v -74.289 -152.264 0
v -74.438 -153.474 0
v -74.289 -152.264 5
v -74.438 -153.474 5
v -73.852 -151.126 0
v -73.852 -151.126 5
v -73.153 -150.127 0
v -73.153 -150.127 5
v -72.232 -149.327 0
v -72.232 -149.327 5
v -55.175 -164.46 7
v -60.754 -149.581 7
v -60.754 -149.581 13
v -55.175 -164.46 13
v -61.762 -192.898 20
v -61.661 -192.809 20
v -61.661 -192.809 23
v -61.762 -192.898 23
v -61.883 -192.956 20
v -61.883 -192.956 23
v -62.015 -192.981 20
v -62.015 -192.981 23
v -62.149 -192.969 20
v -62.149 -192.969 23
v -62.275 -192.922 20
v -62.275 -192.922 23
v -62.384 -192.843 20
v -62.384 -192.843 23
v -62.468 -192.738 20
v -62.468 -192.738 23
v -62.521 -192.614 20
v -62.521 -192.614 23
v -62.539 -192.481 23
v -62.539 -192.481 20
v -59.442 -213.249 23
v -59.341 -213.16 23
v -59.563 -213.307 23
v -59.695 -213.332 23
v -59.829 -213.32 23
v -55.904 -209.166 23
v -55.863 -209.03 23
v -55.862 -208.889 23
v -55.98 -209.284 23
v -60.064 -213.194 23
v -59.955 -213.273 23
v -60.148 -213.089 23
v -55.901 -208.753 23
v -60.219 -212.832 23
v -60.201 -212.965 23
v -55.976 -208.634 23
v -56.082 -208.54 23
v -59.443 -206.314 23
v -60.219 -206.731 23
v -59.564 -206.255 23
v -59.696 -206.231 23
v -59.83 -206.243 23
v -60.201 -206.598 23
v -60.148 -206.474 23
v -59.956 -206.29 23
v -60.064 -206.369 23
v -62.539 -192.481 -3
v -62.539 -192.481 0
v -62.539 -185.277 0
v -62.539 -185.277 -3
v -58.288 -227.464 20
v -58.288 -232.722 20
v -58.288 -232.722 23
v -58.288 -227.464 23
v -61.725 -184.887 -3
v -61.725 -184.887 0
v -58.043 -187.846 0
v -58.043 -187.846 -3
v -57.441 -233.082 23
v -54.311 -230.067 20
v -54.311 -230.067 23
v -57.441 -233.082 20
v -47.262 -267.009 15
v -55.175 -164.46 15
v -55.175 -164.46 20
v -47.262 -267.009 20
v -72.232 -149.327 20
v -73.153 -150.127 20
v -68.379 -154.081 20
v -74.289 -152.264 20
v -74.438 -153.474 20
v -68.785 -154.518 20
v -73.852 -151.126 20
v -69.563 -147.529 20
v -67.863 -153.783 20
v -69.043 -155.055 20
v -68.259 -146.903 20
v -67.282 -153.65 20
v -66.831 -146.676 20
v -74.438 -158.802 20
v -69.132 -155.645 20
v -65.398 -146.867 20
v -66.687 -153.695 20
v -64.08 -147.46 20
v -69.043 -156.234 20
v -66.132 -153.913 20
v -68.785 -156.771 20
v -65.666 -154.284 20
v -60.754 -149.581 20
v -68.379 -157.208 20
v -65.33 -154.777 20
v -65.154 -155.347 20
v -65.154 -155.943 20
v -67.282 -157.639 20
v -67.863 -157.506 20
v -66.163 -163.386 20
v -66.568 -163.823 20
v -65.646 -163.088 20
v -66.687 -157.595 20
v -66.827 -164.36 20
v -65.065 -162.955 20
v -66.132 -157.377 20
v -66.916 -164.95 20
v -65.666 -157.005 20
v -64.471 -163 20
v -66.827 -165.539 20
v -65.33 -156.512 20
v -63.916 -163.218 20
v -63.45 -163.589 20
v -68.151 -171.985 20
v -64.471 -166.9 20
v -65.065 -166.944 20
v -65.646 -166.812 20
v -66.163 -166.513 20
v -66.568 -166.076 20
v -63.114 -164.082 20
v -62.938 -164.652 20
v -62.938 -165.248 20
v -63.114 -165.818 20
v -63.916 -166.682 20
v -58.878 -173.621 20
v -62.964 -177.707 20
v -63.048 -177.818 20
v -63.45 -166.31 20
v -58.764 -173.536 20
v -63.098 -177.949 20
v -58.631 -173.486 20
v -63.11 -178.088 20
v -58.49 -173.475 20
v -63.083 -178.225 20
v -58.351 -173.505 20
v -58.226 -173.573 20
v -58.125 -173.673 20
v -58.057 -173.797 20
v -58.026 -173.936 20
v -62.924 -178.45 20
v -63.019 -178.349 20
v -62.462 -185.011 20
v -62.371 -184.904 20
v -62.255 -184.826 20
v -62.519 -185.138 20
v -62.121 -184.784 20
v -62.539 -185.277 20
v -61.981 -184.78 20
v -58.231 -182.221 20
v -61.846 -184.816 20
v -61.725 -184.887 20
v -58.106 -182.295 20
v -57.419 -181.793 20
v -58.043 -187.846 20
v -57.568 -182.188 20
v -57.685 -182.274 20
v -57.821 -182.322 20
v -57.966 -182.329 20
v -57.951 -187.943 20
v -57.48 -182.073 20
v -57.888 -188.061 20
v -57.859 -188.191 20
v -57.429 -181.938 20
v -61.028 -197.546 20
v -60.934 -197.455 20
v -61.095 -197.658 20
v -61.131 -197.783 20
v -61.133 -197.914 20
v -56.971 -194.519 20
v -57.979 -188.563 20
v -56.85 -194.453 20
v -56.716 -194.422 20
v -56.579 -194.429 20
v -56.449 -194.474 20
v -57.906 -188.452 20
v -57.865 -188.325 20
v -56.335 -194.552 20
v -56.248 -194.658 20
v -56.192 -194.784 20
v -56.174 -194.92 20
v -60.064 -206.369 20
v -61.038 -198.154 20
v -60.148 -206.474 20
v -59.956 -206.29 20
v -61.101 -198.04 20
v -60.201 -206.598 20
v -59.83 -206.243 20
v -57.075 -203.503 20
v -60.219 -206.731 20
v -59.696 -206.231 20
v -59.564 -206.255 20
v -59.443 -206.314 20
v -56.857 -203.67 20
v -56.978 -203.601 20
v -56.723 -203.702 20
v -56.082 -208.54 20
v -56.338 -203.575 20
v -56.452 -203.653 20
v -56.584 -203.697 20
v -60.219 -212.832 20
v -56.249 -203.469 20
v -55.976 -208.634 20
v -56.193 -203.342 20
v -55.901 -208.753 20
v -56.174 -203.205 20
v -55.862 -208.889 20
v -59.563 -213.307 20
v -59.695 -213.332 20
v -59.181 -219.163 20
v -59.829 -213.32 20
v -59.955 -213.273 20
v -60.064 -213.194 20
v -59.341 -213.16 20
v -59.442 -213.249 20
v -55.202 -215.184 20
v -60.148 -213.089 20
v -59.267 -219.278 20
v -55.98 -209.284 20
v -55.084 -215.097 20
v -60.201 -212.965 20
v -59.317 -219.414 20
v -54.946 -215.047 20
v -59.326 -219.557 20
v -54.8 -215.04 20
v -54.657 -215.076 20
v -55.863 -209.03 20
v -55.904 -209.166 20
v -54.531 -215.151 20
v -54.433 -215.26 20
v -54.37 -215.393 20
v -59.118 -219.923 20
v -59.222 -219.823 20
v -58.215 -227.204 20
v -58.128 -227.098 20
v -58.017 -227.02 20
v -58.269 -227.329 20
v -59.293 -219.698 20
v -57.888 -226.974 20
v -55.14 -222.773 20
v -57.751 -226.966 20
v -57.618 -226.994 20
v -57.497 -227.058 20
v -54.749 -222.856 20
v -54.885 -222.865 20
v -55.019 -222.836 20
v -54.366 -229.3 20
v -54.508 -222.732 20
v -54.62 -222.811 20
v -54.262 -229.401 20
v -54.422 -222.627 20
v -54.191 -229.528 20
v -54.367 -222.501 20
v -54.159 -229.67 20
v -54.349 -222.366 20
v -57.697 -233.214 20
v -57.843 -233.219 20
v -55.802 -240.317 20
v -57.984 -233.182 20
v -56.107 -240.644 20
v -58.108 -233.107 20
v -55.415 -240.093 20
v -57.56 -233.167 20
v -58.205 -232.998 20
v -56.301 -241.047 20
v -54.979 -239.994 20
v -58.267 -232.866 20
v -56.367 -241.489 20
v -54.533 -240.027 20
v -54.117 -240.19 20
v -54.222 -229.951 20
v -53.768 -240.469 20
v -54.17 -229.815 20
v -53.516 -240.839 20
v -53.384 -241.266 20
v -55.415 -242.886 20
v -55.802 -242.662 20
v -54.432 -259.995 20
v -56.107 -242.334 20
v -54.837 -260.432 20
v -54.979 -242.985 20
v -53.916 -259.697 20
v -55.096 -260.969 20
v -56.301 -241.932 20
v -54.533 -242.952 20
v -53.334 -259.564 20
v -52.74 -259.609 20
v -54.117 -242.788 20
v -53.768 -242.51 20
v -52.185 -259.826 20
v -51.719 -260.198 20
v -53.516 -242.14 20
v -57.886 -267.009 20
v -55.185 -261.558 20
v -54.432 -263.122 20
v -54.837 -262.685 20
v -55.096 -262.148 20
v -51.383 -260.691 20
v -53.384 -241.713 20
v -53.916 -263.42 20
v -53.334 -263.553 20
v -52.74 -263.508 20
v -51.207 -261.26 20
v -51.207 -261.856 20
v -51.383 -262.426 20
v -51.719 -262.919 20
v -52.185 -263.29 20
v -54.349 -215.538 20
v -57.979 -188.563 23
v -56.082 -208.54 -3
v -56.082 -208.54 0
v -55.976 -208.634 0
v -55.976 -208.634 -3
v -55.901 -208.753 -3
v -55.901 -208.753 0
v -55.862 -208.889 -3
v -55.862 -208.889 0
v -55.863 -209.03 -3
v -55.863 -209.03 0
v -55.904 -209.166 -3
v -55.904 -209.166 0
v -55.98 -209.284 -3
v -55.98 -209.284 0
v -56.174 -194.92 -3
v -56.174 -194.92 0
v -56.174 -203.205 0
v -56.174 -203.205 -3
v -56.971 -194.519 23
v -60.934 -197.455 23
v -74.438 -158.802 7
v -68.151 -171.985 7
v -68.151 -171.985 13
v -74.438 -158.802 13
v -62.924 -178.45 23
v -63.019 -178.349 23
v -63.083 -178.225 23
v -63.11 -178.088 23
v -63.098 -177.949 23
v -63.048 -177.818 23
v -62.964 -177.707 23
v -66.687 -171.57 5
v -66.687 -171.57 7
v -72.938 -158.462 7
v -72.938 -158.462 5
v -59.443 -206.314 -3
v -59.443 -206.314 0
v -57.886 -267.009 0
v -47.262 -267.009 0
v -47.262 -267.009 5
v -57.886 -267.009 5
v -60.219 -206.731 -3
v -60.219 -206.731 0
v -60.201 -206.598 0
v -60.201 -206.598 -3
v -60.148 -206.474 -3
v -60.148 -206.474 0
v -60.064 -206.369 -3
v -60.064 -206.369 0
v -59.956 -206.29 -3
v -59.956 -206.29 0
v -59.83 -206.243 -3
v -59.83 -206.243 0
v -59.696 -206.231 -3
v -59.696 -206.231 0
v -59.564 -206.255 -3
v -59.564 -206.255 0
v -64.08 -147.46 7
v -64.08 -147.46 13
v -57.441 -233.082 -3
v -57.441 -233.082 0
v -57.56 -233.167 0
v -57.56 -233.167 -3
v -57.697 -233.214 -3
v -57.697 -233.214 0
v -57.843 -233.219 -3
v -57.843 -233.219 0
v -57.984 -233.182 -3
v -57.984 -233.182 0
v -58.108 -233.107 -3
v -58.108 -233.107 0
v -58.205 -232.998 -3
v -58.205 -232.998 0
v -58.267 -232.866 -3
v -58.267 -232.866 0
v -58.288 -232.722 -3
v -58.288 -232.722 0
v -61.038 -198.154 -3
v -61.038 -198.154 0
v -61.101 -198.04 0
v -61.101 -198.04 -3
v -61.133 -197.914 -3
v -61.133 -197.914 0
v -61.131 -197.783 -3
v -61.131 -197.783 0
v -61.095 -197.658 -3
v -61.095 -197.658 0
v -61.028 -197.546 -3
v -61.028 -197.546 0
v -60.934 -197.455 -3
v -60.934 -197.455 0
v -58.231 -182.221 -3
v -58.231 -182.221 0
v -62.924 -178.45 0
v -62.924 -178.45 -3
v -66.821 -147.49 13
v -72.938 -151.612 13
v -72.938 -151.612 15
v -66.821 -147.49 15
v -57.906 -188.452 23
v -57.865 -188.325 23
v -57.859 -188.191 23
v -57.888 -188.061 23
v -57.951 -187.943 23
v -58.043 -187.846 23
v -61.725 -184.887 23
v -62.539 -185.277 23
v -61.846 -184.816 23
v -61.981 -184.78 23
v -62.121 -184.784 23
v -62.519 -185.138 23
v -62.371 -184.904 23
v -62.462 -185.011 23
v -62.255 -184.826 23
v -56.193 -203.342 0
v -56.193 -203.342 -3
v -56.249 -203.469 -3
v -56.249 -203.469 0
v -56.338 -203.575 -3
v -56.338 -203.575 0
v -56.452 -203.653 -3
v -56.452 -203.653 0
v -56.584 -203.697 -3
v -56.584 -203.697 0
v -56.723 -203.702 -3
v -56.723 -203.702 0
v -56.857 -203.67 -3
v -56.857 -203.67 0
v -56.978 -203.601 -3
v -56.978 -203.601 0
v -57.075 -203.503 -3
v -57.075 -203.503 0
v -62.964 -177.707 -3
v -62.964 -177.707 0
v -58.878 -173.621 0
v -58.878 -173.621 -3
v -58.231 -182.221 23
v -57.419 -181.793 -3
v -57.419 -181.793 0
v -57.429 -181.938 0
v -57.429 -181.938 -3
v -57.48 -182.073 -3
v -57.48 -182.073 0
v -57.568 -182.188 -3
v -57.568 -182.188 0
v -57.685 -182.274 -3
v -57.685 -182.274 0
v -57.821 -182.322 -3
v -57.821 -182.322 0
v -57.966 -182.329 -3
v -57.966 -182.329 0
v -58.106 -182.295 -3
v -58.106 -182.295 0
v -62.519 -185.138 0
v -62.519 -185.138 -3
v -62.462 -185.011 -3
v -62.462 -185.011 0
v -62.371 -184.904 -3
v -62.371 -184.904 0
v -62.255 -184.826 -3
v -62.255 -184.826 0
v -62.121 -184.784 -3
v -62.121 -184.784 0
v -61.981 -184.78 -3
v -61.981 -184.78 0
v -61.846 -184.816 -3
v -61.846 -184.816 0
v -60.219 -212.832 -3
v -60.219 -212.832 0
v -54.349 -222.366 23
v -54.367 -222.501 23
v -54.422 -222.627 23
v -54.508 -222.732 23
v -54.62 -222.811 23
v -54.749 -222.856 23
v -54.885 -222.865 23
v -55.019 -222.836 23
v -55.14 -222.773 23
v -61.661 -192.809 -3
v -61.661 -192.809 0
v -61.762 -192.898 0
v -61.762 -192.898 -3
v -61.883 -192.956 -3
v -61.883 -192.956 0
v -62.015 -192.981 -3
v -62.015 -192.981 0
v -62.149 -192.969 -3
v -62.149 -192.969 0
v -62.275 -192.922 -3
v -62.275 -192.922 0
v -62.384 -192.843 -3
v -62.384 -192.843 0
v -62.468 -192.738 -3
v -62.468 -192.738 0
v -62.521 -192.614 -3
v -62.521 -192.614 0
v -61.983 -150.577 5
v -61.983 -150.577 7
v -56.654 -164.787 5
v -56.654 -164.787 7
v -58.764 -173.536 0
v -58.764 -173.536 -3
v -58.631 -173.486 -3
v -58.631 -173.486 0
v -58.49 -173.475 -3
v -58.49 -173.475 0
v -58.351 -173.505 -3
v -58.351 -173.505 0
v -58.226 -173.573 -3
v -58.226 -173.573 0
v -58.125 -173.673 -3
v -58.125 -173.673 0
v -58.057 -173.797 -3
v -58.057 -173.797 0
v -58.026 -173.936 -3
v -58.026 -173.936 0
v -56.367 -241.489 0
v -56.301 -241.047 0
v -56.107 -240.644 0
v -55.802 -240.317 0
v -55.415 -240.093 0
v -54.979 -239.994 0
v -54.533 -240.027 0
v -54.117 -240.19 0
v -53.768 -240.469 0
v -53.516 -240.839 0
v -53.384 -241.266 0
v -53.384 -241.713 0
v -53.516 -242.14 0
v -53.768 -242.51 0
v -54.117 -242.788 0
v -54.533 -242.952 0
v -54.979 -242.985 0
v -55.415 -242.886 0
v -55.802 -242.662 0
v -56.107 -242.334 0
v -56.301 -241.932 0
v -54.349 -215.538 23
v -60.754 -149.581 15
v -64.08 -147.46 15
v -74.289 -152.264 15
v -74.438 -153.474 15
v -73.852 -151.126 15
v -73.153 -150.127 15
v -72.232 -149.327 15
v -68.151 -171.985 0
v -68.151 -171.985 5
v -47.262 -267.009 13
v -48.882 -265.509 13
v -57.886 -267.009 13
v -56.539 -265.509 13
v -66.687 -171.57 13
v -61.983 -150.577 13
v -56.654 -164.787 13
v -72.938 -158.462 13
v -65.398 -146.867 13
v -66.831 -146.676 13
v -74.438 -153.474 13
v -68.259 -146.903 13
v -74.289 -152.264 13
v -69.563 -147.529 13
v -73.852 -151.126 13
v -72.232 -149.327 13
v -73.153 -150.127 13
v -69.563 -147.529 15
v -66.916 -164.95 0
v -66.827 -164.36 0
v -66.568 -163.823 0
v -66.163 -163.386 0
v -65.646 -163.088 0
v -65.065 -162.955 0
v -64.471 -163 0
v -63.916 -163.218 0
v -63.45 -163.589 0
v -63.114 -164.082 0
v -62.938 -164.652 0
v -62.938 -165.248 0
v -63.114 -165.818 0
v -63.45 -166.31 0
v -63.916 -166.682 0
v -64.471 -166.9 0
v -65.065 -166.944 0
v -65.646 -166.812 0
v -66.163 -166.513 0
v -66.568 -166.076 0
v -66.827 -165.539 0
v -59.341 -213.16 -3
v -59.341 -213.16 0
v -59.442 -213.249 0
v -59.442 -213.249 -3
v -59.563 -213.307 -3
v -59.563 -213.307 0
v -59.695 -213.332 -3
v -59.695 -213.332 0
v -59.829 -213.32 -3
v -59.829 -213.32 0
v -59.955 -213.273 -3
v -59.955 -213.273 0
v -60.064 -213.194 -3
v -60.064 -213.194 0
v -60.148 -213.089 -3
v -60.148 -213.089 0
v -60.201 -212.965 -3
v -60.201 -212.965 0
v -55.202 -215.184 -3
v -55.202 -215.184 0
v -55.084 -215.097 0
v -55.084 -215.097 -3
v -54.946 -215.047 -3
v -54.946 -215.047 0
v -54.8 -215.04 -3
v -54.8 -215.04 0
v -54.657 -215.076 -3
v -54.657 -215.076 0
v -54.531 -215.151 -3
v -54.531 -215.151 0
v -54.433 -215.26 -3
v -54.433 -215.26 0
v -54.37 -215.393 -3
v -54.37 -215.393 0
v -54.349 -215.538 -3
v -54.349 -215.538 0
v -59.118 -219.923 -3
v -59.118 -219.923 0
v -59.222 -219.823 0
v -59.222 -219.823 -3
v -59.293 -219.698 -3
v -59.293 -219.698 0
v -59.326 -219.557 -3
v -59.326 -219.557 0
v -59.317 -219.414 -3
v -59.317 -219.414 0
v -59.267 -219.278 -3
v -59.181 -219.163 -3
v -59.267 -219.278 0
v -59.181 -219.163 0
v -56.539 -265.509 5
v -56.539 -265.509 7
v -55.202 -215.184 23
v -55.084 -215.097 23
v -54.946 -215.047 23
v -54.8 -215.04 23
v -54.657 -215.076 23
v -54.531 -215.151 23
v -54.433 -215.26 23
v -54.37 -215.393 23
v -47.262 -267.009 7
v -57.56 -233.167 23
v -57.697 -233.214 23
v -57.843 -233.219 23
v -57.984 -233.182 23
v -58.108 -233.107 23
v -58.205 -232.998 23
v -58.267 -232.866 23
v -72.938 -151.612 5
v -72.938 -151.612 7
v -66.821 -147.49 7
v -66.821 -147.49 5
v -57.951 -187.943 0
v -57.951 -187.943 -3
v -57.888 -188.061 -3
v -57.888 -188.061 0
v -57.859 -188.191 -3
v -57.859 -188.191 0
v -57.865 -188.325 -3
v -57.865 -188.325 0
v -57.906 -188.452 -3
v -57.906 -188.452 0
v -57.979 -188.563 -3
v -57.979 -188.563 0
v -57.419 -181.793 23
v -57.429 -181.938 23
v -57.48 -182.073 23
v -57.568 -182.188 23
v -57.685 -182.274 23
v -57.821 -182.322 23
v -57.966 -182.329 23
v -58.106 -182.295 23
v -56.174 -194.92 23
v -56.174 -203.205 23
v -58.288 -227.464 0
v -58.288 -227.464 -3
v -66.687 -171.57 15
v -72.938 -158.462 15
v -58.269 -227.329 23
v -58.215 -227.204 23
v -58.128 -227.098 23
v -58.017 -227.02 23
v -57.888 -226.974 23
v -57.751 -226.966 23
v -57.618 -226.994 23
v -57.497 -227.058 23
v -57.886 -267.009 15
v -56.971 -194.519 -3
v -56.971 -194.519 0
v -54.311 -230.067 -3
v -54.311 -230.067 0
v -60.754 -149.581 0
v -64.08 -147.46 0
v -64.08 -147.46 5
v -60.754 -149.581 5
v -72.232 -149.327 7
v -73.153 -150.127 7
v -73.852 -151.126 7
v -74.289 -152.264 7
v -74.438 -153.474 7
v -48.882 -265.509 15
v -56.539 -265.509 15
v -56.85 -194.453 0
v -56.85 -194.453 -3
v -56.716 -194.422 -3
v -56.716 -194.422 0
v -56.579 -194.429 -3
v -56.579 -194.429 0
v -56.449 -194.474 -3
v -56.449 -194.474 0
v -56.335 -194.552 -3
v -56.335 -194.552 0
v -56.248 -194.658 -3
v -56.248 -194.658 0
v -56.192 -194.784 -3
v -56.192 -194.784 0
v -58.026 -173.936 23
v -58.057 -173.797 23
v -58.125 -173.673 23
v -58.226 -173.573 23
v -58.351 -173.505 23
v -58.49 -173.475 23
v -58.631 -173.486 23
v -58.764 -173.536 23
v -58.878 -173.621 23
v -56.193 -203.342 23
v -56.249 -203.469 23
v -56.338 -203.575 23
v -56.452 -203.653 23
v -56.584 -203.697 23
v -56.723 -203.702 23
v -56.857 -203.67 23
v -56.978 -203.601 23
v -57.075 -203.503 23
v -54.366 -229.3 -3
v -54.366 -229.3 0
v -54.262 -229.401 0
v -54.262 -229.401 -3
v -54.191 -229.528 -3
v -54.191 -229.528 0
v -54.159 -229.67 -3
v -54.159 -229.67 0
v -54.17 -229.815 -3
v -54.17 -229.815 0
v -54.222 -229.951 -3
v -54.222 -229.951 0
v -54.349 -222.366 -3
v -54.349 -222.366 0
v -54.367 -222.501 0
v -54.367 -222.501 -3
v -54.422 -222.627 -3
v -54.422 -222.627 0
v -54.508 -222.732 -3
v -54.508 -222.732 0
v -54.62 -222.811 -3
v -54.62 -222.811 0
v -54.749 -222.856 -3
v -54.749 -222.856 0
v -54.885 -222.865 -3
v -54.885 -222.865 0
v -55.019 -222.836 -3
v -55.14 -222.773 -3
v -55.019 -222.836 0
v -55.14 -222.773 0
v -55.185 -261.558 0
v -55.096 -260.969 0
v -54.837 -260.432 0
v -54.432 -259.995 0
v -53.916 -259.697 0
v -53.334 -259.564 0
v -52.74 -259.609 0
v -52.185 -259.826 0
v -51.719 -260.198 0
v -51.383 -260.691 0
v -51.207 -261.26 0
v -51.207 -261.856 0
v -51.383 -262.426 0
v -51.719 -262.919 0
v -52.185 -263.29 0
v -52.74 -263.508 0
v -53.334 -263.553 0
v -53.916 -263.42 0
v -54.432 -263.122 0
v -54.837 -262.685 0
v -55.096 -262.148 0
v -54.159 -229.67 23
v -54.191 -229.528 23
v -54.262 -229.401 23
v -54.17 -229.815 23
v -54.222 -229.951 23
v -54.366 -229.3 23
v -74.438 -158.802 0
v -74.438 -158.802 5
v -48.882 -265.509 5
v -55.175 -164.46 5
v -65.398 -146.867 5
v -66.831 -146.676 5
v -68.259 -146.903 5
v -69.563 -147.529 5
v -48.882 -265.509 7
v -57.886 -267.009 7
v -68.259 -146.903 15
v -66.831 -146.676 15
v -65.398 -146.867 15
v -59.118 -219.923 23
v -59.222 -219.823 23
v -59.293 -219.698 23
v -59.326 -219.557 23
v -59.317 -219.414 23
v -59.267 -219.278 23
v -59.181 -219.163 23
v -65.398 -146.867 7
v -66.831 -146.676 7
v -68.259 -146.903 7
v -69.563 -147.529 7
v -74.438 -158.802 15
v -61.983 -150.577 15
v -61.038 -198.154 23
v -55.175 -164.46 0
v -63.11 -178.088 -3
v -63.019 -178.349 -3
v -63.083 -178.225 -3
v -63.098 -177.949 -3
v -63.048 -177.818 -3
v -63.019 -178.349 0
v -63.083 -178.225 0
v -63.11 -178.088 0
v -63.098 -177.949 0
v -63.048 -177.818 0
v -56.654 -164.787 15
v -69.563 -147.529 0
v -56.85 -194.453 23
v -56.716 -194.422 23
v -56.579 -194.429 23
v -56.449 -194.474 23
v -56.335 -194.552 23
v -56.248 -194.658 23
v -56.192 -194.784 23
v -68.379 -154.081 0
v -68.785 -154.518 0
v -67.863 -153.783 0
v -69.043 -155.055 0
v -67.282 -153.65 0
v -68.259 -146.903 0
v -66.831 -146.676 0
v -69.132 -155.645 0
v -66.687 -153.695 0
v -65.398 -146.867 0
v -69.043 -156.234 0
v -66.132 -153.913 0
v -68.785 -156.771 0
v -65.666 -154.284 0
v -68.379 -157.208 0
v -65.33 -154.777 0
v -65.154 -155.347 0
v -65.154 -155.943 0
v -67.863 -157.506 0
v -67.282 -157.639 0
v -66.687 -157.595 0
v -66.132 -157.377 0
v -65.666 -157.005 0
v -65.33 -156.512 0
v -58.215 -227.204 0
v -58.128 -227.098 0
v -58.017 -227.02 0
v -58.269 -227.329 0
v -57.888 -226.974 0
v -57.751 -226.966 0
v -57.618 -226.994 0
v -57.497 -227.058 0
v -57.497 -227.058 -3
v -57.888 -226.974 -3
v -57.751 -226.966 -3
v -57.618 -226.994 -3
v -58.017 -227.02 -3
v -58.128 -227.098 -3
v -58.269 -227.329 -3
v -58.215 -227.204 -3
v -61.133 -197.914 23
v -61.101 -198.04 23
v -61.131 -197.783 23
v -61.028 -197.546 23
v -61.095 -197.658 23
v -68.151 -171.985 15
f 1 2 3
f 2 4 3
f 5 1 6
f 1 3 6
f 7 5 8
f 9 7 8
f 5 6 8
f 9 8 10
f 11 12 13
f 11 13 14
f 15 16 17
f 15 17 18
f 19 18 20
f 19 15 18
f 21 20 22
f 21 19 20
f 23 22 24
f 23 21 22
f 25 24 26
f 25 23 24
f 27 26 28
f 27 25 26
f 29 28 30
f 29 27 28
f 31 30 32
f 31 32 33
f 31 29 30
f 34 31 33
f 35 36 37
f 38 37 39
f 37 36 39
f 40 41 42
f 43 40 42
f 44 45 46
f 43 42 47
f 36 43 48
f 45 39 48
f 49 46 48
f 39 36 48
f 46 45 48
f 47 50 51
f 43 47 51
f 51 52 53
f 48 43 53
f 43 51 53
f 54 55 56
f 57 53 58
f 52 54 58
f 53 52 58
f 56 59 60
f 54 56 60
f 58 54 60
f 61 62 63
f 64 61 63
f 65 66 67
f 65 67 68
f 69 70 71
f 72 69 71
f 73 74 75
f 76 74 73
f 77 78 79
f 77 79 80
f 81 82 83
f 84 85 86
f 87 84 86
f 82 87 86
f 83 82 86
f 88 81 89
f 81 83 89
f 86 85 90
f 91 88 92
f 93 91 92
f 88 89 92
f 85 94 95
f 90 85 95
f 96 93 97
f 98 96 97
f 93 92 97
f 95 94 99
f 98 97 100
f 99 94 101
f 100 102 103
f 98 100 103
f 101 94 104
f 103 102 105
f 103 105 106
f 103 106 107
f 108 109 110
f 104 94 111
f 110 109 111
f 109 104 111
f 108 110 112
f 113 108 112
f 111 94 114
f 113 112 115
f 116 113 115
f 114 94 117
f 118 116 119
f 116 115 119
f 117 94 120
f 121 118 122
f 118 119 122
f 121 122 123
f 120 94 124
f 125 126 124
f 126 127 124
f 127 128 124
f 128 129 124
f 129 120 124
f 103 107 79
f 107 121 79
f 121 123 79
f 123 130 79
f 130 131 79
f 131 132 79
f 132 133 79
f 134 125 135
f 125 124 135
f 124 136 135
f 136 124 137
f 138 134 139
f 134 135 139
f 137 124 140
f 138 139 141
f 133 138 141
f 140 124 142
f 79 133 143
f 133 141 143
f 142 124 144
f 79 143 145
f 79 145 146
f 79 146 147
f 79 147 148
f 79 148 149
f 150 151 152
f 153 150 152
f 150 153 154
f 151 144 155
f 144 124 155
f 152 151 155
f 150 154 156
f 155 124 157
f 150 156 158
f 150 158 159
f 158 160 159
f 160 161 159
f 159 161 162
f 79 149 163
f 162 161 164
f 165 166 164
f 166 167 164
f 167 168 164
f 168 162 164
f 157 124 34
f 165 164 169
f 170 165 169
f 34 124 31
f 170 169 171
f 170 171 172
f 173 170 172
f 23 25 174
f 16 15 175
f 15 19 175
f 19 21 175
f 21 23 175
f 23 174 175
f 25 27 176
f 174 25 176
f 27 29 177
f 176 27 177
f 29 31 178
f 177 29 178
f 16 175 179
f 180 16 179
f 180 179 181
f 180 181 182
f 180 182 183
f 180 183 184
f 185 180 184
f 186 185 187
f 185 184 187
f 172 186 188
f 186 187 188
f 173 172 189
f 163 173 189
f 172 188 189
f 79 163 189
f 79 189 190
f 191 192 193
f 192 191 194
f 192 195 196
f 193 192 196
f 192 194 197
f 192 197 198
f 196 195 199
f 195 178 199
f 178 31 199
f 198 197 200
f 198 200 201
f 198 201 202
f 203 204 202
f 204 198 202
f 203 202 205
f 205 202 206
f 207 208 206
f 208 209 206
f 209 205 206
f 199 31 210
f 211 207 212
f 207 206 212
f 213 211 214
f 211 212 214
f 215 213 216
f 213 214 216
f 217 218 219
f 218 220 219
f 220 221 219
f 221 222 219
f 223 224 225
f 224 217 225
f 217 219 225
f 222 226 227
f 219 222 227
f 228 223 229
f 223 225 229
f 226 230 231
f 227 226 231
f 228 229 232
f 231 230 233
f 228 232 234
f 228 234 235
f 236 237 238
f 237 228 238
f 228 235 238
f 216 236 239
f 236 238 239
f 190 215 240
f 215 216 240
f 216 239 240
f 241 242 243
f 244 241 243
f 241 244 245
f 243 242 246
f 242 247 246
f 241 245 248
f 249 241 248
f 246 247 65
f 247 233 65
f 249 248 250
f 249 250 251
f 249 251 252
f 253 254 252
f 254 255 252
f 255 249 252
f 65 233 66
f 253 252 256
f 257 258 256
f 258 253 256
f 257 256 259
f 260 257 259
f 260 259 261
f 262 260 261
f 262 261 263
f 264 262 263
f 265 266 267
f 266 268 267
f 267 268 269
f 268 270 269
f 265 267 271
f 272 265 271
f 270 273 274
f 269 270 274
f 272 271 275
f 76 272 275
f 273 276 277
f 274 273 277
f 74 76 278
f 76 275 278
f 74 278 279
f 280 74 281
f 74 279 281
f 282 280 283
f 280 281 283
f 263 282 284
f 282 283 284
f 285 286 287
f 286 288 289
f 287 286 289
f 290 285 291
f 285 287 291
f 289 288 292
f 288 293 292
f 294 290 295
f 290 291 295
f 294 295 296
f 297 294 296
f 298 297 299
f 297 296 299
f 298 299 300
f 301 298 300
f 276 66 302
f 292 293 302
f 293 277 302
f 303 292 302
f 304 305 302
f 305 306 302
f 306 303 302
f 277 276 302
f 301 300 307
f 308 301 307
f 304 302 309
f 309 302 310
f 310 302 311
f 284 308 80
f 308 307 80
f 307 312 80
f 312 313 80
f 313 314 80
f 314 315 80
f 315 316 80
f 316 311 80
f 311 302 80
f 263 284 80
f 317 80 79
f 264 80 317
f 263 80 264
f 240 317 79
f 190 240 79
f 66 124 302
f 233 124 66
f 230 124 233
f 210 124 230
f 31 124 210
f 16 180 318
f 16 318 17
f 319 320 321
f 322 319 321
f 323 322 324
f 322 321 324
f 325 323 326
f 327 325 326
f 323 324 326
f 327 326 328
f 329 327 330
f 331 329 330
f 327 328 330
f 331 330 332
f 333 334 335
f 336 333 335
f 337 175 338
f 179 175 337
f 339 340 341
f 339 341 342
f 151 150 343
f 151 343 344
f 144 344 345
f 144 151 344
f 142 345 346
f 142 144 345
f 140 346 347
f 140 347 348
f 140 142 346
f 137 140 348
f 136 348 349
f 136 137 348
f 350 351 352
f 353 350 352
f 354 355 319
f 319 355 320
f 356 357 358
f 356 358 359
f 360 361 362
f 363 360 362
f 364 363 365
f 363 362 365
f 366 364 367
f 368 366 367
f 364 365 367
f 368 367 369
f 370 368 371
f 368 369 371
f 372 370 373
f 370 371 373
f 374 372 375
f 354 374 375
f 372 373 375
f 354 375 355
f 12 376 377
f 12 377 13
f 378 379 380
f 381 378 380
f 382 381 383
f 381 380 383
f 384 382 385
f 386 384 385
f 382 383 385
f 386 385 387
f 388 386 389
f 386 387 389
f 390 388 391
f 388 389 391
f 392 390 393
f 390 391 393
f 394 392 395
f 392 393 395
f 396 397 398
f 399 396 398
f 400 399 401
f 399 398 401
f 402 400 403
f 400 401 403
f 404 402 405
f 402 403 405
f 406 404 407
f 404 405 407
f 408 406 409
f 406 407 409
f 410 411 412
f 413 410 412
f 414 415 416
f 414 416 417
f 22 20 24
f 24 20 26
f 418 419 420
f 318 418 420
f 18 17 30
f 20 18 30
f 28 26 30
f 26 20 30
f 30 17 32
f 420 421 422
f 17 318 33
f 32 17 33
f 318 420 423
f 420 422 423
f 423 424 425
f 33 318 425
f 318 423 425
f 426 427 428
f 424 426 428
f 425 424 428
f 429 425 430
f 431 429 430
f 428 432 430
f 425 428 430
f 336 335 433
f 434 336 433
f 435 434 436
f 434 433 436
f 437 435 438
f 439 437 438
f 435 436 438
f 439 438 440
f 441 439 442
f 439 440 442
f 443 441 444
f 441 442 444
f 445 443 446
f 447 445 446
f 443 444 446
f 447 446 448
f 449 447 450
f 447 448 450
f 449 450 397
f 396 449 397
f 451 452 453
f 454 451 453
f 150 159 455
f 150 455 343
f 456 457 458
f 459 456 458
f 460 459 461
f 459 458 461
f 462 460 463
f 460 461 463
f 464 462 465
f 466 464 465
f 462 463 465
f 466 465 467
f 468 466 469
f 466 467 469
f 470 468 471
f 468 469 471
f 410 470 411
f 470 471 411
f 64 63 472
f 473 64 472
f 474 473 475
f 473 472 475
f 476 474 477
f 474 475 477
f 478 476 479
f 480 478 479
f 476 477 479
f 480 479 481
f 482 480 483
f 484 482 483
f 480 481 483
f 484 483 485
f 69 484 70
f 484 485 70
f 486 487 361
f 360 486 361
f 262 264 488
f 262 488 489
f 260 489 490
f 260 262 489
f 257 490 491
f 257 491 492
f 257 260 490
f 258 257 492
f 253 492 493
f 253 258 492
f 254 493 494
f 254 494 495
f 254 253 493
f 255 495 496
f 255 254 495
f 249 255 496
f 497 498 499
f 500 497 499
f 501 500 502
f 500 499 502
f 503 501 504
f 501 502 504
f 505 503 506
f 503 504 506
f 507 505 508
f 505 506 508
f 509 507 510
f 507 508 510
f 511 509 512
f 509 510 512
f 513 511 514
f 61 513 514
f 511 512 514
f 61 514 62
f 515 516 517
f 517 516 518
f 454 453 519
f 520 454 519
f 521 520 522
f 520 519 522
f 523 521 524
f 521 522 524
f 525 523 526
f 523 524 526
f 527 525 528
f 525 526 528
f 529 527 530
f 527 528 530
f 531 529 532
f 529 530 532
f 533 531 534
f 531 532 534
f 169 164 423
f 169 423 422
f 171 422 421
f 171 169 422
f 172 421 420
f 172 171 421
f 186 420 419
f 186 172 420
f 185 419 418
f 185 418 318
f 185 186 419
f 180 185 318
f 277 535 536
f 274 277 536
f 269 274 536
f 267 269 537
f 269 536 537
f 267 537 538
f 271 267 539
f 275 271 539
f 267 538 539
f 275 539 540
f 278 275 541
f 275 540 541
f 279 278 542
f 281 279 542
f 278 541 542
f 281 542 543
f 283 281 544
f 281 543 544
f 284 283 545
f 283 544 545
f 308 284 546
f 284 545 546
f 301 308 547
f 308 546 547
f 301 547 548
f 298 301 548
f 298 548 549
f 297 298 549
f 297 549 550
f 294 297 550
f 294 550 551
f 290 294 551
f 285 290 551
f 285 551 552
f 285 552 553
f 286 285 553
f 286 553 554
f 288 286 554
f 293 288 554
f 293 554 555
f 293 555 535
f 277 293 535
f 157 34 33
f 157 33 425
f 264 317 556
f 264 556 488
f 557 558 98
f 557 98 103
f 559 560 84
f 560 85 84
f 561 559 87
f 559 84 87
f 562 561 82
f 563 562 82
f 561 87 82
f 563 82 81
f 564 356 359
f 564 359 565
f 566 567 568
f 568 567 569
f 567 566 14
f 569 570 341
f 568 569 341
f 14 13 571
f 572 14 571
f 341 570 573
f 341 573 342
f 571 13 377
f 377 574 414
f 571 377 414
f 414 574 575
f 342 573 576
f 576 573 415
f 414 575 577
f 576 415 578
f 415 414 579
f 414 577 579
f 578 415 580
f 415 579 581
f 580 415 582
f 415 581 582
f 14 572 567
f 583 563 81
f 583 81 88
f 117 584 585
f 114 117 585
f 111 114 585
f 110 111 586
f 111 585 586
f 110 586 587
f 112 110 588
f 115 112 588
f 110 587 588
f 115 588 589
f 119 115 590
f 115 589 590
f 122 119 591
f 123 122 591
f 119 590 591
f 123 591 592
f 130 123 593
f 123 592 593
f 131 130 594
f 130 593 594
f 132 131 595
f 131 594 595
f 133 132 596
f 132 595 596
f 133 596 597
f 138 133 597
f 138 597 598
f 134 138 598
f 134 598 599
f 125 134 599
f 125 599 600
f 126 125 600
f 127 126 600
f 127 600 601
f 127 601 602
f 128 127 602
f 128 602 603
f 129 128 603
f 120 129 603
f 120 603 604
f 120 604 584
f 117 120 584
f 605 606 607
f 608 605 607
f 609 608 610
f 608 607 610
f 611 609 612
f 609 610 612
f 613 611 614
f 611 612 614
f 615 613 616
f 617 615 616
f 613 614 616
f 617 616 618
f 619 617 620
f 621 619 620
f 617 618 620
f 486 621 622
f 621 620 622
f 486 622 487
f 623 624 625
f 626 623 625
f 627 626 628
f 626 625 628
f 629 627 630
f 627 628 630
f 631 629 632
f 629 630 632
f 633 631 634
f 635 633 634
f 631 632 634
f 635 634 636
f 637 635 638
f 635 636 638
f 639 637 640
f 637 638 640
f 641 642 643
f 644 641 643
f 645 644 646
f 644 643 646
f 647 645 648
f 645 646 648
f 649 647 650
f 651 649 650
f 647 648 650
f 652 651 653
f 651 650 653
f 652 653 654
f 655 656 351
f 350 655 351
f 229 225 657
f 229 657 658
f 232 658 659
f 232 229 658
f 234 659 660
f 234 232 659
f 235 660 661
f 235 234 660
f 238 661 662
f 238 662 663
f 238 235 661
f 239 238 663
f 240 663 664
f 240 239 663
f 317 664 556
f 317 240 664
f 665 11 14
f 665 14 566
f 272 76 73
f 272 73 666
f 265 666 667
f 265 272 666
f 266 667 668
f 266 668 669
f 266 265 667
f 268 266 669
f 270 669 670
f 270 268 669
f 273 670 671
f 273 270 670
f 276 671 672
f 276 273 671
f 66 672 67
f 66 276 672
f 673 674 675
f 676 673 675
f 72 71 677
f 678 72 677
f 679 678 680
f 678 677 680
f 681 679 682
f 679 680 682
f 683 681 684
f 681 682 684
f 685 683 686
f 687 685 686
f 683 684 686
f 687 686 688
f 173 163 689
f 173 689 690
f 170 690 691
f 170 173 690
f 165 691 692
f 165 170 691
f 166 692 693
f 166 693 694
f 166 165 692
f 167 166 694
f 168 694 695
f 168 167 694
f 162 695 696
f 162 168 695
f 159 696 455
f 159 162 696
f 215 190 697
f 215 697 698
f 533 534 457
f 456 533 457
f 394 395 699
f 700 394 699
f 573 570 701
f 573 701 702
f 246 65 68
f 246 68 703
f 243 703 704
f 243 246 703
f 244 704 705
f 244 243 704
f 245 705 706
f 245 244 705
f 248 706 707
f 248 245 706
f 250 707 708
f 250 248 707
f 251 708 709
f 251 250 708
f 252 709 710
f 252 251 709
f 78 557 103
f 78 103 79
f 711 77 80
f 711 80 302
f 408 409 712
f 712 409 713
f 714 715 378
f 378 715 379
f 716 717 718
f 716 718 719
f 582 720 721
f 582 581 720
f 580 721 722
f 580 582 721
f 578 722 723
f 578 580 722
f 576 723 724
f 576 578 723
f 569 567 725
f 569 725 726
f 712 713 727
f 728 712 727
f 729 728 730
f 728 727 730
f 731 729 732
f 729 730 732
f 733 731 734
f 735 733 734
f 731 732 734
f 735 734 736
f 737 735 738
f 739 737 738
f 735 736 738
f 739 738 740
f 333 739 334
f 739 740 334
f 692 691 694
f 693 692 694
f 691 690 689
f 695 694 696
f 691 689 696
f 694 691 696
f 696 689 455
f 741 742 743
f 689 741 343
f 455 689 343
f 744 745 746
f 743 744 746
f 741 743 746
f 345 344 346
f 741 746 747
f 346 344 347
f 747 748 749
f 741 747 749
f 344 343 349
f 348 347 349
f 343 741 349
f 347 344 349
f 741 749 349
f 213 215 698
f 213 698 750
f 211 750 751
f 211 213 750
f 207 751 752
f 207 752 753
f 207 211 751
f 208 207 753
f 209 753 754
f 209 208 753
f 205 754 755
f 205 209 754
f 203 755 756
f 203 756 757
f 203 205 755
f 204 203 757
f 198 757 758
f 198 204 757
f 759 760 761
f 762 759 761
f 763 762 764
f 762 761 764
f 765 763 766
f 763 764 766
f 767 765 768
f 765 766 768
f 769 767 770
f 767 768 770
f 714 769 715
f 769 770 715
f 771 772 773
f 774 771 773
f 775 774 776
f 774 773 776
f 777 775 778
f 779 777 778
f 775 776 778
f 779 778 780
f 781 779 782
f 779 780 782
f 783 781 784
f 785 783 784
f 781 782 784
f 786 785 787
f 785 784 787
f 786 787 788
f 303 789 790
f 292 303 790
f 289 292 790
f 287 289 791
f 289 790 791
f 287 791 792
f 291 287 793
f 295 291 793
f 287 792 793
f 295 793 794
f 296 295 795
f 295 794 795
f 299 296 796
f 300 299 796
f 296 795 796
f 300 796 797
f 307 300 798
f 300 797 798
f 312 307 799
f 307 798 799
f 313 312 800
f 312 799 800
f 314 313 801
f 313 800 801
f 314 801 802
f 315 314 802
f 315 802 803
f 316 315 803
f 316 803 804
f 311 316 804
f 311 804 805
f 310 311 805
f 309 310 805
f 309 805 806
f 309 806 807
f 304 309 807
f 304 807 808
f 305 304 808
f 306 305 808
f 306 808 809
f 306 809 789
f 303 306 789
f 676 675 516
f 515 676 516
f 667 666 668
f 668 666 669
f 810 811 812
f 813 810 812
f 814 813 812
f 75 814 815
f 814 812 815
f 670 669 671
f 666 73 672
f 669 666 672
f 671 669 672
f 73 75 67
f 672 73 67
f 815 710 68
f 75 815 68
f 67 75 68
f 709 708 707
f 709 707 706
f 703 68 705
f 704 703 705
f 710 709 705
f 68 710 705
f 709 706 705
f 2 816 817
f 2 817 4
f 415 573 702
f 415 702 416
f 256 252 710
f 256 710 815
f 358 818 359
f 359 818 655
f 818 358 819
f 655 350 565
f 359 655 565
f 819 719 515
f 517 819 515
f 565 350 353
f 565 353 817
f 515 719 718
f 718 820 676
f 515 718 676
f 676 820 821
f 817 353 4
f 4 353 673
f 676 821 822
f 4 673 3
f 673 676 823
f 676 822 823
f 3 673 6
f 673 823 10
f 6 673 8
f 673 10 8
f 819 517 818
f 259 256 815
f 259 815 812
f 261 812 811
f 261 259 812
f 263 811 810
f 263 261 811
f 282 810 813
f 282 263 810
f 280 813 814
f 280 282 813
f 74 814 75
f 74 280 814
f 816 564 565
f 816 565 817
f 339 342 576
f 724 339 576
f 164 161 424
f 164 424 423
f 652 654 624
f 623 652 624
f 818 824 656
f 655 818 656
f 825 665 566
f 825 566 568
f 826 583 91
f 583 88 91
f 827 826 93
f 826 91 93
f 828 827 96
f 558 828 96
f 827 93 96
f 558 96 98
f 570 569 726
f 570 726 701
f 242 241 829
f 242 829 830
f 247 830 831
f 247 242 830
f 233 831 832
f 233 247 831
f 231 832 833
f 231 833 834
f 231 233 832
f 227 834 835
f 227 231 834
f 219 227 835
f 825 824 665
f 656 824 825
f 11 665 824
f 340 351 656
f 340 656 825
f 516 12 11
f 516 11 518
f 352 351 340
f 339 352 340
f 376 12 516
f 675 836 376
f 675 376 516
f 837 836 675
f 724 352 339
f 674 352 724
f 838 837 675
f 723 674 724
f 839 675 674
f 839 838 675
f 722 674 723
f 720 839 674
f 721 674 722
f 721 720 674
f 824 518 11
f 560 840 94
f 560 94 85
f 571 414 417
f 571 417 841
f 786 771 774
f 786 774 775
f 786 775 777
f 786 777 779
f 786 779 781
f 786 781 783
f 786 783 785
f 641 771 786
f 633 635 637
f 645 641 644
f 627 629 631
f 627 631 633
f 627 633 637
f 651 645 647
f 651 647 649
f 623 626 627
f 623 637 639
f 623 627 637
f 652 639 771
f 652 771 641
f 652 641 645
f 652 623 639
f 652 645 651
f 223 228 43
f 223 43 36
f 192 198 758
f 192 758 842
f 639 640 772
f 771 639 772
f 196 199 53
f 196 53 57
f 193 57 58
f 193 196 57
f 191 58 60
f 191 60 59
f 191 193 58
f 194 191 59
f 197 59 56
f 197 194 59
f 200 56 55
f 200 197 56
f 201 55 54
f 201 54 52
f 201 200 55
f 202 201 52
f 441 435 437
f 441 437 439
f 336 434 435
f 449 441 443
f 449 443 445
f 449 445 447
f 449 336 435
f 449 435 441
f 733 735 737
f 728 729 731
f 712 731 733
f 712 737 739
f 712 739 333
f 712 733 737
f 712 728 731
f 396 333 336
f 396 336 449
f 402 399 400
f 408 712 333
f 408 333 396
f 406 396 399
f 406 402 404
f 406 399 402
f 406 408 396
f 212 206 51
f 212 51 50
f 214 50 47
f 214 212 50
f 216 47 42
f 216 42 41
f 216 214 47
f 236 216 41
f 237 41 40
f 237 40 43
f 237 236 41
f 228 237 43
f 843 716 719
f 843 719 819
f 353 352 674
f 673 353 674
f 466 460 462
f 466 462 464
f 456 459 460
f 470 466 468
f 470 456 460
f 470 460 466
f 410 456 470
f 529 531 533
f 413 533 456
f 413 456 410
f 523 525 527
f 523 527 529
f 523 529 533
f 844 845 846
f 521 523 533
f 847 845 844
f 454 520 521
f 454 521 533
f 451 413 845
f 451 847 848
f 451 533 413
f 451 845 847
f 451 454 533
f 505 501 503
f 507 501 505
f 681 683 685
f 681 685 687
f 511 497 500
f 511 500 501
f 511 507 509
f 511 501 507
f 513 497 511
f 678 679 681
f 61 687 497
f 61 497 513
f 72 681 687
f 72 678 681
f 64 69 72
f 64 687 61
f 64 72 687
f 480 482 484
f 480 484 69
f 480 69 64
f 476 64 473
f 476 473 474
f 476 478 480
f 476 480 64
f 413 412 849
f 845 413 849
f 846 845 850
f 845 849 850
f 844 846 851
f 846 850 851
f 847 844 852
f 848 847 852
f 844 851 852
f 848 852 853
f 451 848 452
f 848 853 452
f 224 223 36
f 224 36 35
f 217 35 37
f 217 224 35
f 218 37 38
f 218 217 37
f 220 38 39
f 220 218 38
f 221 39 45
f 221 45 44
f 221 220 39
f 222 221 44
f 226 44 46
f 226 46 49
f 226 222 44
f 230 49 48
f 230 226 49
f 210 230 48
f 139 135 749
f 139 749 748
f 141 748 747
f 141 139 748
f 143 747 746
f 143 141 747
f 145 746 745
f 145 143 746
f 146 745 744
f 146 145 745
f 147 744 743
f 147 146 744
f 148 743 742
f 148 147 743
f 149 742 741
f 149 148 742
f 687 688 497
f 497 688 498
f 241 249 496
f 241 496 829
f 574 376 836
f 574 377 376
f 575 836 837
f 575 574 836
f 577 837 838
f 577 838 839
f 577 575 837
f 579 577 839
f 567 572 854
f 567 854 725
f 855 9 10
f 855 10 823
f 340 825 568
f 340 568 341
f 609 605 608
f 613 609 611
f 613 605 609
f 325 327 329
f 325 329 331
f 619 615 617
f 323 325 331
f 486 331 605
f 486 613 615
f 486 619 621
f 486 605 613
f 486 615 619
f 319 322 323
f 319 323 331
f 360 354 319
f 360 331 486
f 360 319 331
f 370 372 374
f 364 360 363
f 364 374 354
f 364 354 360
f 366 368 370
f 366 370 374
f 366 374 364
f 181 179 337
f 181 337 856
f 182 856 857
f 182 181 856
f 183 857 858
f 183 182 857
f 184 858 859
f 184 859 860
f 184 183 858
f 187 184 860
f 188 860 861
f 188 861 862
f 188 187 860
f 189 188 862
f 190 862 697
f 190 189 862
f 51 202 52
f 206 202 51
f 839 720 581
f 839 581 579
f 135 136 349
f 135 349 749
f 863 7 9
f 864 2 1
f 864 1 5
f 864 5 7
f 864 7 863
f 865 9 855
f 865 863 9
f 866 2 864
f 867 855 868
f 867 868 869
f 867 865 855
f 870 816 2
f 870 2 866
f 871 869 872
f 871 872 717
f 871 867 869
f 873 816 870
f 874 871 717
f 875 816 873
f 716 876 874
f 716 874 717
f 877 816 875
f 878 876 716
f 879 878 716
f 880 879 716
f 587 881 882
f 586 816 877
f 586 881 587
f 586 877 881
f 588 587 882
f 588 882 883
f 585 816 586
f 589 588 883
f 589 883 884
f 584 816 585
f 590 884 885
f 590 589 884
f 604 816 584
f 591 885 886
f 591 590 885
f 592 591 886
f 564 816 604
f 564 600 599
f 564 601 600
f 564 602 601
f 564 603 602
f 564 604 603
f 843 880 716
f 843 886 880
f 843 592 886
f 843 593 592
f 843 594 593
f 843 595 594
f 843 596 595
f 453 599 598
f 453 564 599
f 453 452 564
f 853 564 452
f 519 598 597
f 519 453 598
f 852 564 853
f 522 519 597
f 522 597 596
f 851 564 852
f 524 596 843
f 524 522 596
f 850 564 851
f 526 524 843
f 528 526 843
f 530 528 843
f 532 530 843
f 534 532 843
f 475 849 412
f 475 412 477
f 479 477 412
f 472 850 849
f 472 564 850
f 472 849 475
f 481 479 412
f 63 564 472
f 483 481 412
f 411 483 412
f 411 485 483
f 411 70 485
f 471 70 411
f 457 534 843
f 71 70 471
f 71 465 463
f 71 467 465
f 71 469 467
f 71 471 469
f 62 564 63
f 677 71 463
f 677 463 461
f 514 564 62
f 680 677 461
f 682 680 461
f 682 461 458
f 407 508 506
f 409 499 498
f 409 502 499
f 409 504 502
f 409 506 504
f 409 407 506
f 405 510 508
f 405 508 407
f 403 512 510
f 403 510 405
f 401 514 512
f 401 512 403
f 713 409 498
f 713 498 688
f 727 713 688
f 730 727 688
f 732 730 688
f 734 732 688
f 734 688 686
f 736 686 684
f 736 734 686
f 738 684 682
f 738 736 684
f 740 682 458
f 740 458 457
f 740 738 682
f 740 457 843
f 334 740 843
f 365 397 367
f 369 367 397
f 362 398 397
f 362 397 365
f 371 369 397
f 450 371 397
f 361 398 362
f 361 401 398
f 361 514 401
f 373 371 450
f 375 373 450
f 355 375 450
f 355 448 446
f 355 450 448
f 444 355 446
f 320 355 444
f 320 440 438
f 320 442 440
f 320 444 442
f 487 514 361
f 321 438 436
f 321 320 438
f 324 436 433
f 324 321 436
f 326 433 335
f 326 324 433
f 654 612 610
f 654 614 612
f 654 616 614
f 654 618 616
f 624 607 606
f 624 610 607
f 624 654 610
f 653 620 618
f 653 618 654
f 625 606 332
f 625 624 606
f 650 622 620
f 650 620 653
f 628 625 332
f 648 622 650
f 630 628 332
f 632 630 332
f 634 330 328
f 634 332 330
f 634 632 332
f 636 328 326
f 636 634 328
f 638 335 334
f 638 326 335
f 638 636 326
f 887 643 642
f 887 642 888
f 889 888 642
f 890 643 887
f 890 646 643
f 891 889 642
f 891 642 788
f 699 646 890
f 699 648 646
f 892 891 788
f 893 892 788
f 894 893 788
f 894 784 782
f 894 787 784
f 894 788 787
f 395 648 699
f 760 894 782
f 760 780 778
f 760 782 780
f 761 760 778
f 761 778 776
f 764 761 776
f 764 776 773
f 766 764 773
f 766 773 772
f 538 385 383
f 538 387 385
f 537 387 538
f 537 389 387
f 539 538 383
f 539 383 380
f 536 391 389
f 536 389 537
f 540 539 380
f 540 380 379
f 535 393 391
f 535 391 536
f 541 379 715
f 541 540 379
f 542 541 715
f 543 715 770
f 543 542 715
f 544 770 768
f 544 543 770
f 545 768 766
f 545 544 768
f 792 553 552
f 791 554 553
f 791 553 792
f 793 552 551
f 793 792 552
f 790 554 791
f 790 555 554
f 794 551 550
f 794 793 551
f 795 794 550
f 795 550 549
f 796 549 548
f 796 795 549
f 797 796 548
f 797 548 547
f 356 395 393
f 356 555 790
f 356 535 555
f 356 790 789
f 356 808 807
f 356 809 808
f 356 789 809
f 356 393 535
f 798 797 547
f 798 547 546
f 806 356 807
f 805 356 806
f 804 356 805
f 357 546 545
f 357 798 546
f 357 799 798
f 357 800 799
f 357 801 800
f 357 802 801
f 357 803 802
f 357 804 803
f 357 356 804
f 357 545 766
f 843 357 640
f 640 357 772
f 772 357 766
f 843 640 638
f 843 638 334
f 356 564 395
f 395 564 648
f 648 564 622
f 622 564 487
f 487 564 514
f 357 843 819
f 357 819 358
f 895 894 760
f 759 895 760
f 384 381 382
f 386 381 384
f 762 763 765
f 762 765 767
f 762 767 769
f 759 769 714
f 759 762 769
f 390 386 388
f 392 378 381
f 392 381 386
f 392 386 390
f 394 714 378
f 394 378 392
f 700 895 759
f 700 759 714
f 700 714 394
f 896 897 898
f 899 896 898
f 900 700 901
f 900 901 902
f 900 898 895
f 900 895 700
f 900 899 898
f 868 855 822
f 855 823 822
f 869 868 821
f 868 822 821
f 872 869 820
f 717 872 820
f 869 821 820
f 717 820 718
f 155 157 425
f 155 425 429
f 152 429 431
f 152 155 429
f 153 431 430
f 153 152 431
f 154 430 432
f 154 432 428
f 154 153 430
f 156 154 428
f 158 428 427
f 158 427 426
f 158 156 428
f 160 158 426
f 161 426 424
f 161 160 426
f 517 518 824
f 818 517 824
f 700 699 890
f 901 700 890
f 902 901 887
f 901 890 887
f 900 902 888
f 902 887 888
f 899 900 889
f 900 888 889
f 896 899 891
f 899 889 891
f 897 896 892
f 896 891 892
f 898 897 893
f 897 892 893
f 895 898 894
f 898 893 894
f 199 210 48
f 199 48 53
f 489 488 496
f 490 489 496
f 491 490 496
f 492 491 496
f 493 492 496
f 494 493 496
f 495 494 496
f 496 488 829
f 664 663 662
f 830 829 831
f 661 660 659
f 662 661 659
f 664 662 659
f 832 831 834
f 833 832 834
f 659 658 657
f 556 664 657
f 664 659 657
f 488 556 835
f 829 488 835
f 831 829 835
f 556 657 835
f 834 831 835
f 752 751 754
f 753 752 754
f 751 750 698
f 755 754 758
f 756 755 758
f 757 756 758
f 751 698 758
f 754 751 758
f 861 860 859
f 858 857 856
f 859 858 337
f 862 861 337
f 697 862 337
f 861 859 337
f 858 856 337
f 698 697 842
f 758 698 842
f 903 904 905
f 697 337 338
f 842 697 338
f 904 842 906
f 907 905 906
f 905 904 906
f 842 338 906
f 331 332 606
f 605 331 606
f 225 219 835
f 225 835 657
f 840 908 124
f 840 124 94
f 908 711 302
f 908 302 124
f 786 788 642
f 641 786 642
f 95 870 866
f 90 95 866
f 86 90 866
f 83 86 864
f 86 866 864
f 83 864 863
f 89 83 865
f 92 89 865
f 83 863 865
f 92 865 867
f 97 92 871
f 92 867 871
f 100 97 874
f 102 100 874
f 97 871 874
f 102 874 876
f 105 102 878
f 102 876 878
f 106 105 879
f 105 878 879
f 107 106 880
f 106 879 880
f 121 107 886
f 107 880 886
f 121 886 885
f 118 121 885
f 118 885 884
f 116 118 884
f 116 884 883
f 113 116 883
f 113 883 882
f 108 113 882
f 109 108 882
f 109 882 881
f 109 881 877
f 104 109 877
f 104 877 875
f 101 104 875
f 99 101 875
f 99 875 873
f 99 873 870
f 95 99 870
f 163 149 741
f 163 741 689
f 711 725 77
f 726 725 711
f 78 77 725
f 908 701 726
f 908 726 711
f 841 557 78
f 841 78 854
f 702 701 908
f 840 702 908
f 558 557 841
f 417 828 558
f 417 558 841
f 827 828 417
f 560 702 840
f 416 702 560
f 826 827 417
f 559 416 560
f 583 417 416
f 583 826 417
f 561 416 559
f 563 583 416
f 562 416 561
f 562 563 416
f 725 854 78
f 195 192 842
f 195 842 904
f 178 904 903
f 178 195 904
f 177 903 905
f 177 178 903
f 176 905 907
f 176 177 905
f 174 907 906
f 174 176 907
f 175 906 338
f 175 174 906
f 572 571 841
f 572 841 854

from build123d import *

# Parameters (mm, degrees)
EXTRUDE_1_DEPTH     = 20
CUT_EXTRUDE_START   = 3
CUT_EXTRUDE_1_DEPTH = 2
EXTRUDE_2_DEPTH     = 3
SKETCH_115_R        = 2
SKETCH_115_R_2      = 1.5
CUT_EXTRUDE_2_DEPTH = 279.143495269
FILLET_1_R          = 5
SKETCH_116_R        = 2
CUT_EXTRUDE_3_DEPTH = 279.143495269


with BuildPart() as part:
    # 草图1 → 凸台-拉伸1 (new body)
    with BuildSketch(Plane(origin=(0, 0, 0), x_dir=(-1, 0, 0), z_dir=(0, 0, 1))):
        Polygon((74.438153655, 158.80166336), (74.438153655, 150.81385389), (66.84370456, 145.696765598), (60.754110218, 149.581447702), (55.174801085, 164.459776844), (47.261962171, 267.008923523), (57.886031057, 267.008923523), (68.150536307, 171.985087167), align=None)
    extrude(amount=EXTRUDE_1_DEPTH)

    # 草图113 → 切除-拉伸1 (cut)
    with BuildSketch(Plane(origin=(0, 0, 10), x_dir=(-1, 0, 0), z_dir=(0, 0, -1)).offset(CUT_EXTRUDE_START)):
        Polygon((55.174801085, -164.459776844), (47.261962171, -267.008923523), (57.886031057, -267.008923523), (68.150536307, -171.985087167), (74.438153655, -158.80166336), (74.438153655, -150.81385389), (66.84370456, -145.696765598), (60.754110218, -149.581447702), align=None)
        Polygon((56.653989783, -164.787273226), (48.882163106, -265.508923523), (56.539335626, -265.508923523), (66.686650777, -171.56997655), (72.938153655, -158.462274967), (72.938153655, -151.61189122), (66.821209313, -147.490335609), (61.982843766, -150.576832179), align=None, mode=Mode.SUBTRACT)
    cut_extrude_1 = extrude(amount=CUT_EXTRUDE_1_DEPTH, mode=Mode.SUBTRACT)

    # 镜向1: 切除-拉伸1 across plane
    add(cut_extrude_1.mirror(Plane(origin=(0, 0, 10), x_dir=(1, 0, 0), z_dir=(0, 0, -1))), mode=Mode.SUBTRACT)

    # 草图114 → 凸台-拉伸2 (add)
    with BuildSketch(Plane(origin=(0, 0, 0), x_dir=(-1, 0, 0), z_dir=(0, 0, -1))):
        with BuildLine():
            Line((58.025627707, -173.935710741), (57.419339245, -181.793113798))
            ThreePointArc((57.419339245, -181.793113798), (57.684559456, -182.273815488), (58.231058467, -182.221330198))
            Line((58.231058467, -182.221330198), (62.923737604, -178.450317813))
            ThreePointArc((62.923737604, -178.450317813), (63.109801357, -178.087671778), (62.964089914, -177.707014396))
            Line((62.964089914, -177.707014396), (58.877699239, -173.620623723))
            ThreePointArc((58.877699239, -173.620623723), (58.350728284, -173.505214058), (58.025627707, -173.935710741))
        make_face()
        with BuildLine():
            Line((60.934012548, -197.454954781), (56.971204979, -194.518647305))
            ThreePointArc((56.971204979, -194.518647305), (56.448628412, -194.473820011), (56.173532656, -194.920382527))
            Line((56.173532656, -194.920382527), (56.173532659, -203.204850558))
            ThreePointArc((56.173532659, -203.204850558), (56.516796592, -203.679649258), (57.07526788, -203.50252288))
            Line((57.07526788, -203.50252288), (61.038075447, -198.154362325))
            ThreePointArc((61.038075447, -198.154362325), (61.130896043, -197.783106421), (60.934012548, -197.454954781))
        make_face()
        with BuildLine():
            Line((57.978905554, -188.563420266), (61.66084791, -192.808841031))
            ThreePointArc((61.66084791, -192.808841031), (62.213413835, -192.949681307), (62.538578919, -192.481244809))
            Line((62.538578919, -192.481244809), (62.538578917, -185.277034446))
            ThreePointArc((62.538578917, -185.277034446), (62.25468012, -184.826146133), (61.725377837, -184.887284419))
            Line((61.725377837, -184.887284419), (58.043435482, -187.846074018))
            ThreePointArc((58.043435482, -187.846074018), (57.858647408, -188.191026703), (57.978905554, -188.563420266))
        make_face()
        with BuildLine():
            Line((59.442872047, -206.313835661), (56.081759275, -208.539915803))
            ThreePointArc((56.081759275, -208.539915803), (55.862445165, -208.889140713), (55.980118188, -209.284374538))
            Line((55.980118188, -209.284374538), (59.341230961, -213.159866488))
            ThreePointArc((59.341230961, -213.159866488), (59.893796886, -213.300706764), (60.218961971, -212.832270266))
            Line((60.218961971, -212.832270266), (60.218961969, -206.730698174))
            ThreePointArc((60.218961969, -206.730698174), (59.955557657, -206.290218344), (59.442872047, -206.313835661))
        make_face()
        with BuildLine():
            Line((59.180756665, -219.162865233), (55.202116295, -215.184224865))
            ThreePointArc((55.202116295, -215.184224865), (54.657221188, -215.07583849), (54.348562904, -215.537778256))
            Line((54.348562904, -215.537778256), (54.348562906, -222.366147911))
            ThreePointArc((54.348562906, -222.366147911), (54.620062064, -222.810880826), (55.139712367, -222.772635293))
            Line((55.139712367, -222.772635293), (59.118352735, -219.922906006))
            ThreePointArc((59.118352735, -219.922906006), (59.325526398, -219.557333957), (59.180756665, -219.162865233))
        make_face()
        with BuildLine():
            Line((57.496934877, -227.057752455), (54.36647935, -229.299963354))
            ThreePointArc((54.36647935, -229.299963354), (54.158945852, -229.670183565), (54.310729697, -230.066535456))
            Line((54.310729697, -230.066535456), (57.441185226, -233.082359755))
            ThreePointArc((57.441185226, -233.082359755), (57.983724881, -233.182410645), (58.288084339, -232.722275036))
            Line((58.288084339, -232.722275036), (58.288084338, -227.464239836))
            ThreePointArc((58.288084338, -227.464239836), (58.01658518, -227.019506922), (57.496934877, -227.057752455))
        make_face()
    extrude_2 = extrude(amount=EXTRUDE_2_DEPTH)

    # 镜向2: 凸台-拉伸2 across plane
    add(extrude_2.mirror(Plane(origin=(0, 0, 10), x_dir=(1, 0, 0), z_dir=(0, 0, -1))))

    # 草图115 → 切除-拉伸2 (cut, through all)
    with BuildSketch(Plane(origin=(0, 0, 0), x_dir=(-1, 0, 0), z_dir=(0, 0, -1))):
        with Locations((64.915803172, -164.949805196)):
            Circle(SKETCH_115_R)
        with Locations((67.132054217, -155.644675734)):
            Circle(SKETCH_115_R)
        with Locations((54.86719071, -241.489374019)):
            Circle(SKETCH_115_R_2)
    extrude(amount=-CUT_EXTRUDE_2_DEPTH, mode=Mode.SUBTRACT)

    # 圆角1
    fillet_1_edges = [part.edges().sort_by_distance(p)[0] for p in [
        (-74.438153655, -150.81385389, 17.5),
        (-66.84370456, -145.696765598, 17.5),
        (-74.438153655, -150.81385389, 2.5),
        (-66.84370456, -145.696765598, 2.5),
        (-66.84370456, -145.696765598, 10),
        (-74.438153655, -150.81385389, 10),
    ]]
    fillet(fillet_1_edges, radius=FILLET_1_R)

    # 草图116 → 切除-拉伸3 (cut, through all)
    with BuildSketch(Plane(origin=(0, 0, 0), x_dir=(-1, 0, 0), z_dir=(0, 0, -1))):
        with Locations((53.184824598, -261.558408948)):
            Circle(SKETCH_116_R)
    extrude(amount=-CUT_EXTRUDE_3_DEPTH, mode=Mode.SUBTRACT)


solid = part.part
